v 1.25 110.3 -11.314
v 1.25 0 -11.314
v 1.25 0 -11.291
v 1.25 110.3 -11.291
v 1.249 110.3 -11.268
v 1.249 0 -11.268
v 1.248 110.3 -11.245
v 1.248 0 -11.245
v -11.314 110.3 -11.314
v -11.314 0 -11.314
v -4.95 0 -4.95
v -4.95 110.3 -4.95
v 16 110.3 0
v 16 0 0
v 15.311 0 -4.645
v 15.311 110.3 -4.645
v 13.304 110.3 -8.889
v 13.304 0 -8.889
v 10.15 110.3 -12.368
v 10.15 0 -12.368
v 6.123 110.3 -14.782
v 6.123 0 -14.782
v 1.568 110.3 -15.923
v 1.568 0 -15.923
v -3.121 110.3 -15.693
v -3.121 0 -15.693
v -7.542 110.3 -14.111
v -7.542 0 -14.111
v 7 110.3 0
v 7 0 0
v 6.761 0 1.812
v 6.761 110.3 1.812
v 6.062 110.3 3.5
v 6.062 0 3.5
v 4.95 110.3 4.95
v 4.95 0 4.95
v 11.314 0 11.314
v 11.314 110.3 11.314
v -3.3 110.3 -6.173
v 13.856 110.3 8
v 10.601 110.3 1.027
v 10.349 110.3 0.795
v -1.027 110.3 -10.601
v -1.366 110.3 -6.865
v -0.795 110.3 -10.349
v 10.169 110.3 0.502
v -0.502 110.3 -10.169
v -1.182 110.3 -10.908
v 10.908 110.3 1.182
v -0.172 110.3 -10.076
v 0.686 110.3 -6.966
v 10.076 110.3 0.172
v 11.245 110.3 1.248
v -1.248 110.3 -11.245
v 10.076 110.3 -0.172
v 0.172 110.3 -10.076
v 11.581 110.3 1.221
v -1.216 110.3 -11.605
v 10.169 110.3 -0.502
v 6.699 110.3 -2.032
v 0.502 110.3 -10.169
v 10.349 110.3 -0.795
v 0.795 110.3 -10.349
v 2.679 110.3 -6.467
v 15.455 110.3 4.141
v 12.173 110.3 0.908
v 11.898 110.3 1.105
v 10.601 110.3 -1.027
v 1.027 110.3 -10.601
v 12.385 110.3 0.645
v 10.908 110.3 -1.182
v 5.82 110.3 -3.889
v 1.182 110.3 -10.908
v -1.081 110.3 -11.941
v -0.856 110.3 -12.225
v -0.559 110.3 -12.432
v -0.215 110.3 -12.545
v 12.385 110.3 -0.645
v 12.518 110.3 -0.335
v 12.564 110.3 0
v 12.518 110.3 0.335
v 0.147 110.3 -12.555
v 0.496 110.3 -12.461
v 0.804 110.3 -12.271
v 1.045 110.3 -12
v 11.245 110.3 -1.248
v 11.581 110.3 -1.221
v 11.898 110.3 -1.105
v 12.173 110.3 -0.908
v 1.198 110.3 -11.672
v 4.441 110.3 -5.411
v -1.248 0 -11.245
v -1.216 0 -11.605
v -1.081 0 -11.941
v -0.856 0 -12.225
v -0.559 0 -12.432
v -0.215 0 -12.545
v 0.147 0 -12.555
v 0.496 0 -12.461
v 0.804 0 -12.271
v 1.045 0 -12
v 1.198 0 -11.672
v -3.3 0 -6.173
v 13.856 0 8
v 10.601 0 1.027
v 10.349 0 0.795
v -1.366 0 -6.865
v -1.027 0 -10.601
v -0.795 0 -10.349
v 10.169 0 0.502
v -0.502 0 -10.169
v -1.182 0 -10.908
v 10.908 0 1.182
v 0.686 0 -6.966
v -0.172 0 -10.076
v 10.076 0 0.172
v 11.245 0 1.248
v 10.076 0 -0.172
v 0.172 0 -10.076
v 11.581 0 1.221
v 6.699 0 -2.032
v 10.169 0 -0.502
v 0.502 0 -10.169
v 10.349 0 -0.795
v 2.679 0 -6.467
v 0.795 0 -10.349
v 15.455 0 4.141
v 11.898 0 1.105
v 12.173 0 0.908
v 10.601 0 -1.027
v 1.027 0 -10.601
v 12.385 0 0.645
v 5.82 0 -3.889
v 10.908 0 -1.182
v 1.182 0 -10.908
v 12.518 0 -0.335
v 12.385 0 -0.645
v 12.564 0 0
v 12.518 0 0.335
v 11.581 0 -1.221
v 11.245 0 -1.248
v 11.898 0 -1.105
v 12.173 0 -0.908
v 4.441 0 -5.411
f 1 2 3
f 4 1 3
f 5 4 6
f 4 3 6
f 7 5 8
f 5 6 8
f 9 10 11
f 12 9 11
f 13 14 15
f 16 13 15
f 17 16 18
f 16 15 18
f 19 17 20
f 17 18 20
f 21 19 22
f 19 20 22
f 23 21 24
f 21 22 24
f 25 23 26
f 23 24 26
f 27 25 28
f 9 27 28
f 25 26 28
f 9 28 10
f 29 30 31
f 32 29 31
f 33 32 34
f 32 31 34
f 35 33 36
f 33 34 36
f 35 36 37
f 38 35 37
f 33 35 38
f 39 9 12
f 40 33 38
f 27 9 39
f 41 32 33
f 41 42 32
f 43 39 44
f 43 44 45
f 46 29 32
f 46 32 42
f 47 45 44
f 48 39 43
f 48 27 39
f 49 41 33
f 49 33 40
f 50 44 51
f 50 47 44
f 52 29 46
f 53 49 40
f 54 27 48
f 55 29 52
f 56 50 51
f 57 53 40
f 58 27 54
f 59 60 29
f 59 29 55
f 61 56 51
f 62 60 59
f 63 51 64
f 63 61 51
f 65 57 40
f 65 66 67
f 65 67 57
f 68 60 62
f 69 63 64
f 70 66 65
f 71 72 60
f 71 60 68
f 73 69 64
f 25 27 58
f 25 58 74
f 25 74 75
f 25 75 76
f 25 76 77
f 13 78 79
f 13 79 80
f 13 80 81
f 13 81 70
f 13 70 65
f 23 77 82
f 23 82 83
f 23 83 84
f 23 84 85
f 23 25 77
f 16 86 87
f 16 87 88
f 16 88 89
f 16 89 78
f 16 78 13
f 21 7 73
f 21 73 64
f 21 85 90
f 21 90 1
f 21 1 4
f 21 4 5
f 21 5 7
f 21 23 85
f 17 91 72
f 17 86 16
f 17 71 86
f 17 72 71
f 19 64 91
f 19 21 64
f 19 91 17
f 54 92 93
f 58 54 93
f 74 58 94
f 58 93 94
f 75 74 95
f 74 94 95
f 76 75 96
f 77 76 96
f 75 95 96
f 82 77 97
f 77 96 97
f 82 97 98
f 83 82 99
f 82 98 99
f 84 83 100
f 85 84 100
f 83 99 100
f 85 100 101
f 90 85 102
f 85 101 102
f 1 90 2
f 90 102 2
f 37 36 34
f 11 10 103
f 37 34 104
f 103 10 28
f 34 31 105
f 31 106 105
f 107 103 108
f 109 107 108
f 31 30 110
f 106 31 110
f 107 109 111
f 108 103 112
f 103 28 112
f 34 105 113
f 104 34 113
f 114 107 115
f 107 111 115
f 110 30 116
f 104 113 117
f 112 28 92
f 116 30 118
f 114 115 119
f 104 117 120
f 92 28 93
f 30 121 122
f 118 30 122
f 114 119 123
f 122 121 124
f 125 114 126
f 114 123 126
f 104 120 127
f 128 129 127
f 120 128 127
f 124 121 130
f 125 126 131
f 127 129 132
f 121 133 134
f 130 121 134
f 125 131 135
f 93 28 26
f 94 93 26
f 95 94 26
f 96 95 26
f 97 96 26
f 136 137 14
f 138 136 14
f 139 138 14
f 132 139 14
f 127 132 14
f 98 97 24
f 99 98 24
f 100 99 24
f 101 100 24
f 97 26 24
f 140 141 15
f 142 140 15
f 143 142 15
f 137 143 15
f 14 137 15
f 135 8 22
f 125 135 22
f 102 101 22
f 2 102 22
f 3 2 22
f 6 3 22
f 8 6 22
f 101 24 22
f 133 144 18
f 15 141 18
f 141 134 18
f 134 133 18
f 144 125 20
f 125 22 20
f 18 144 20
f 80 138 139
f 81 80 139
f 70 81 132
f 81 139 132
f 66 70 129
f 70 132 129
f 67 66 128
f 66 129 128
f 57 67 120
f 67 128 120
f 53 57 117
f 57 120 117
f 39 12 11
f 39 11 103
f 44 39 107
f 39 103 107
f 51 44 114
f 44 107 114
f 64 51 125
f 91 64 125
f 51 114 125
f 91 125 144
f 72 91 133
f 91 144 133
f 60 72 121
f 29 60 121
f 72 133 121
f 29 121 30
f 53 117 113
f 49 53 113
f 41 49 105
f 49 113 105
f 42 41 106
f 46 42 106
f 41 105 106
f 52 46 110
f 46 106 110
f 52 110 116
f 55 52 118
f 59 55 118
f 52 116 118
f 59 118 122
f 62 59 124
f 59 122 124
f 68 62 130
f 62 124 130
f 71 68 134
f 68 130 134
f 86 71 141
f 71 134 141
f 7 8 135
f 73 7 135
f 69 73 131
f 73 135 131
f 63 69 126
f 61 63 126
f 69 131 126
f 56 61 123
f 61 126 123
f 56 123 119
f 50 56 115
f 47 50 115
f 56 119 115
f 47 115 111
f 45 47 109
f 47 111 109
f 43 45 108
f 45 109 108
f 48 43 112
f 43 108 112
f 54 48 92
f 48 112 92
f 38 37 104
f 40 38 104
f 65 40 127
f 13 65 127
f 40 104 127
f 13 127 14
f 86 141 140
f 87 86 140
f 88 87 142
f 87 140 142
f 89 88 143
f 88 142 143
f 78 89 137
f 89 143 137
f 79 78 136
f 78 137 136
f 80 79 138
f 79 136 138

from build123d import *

# Parameters (mm, degrees)
BOSS_EXTRUDE1_DEPTH = 110.3


with BuildPart() as part:
    # Sketch1 → Boss-Extrude1 (new body)
    with BuildSketch(Plane(origin=(0, 0, 0), x_dir=(1, 0, 0), z_dir=(0, 1, 0))):
        with BuildLine():
            Line((-8, 8), (-4.949747468, 4.949747468))
            ThreePointArc((-4.949747468, 4.949747468), (2.678784027, 6.467156728), (7, 0))
            ThreePointArc((7, 0), (6.467156728, -2.678784027), (4.949747468, -4.949747468))
            Line((4.949747468, -4.949747468), (8, -8))
            ThreePointArc((8, -8), (10.197365132, -4.900382063), (11.244655102, -1.248091194))
            ThreePointArc((11.244655102, -1.248091194), (10.063708499, 0), (11.244655102, 1.248091194))
            ThreePointArc((11.244655102, 1.248091194), (8, 8), (1.248091194, 11.244655102))
            ThreePointArc((1.248091194, 11.244655102), (0, 10.063708499), (-1.248091194, 11.244655102))
            ThreePointArc((-1.248091194, 11.244655102), (-4.900382063, 10.197365132), (-8, 8))
        make_face()
        with BuildLine():
            Line((-11.313708499, 11.313708499), (-8, 8))
            ThreePointArc((-8, 8), (-4.900382063, 10.197365132), (-1.248091194, 11.244655102))
            ThreePointArc((-1.248091194, 11.244655102), (-0.034539887, 12.563231206), (1.25, 11.313708499))
            ThreePointArc((1.25, 11.313708499), (1.249522707, 11.279168612), (1.248091194, 11.244655102))
            ThreePointArc((1.248091194, 11.244655102), (8, 8), (11.244655102, 1.248091194))
            ThreePointArc((11.244655102, 1.248091194), (12.17283109, 0.907969368), (12.563708499, 0))
            ThreePointArc((12.563708499, 0), (12.17283109, -0.907969368), (11.244655102, -1.248091194))
            ThreePointArc((11.244655102, -1.248091194), (10.197365132, -4.900382063), (8, -8))
            Line((8, -8), (11.313708499, -11.313708499))
            ThreePointArc((11.313708499, -11.313708499), (14.78207252, -6.122934918), (16, 0))
            ThreePointArc((16, 0), (6.122934918, 14.78207252), (-11.313708499, 11.313708499))
        make_face()
    extrude(amount=BOSS_EXTRUDE1_DEPTH)


solid = part.part
